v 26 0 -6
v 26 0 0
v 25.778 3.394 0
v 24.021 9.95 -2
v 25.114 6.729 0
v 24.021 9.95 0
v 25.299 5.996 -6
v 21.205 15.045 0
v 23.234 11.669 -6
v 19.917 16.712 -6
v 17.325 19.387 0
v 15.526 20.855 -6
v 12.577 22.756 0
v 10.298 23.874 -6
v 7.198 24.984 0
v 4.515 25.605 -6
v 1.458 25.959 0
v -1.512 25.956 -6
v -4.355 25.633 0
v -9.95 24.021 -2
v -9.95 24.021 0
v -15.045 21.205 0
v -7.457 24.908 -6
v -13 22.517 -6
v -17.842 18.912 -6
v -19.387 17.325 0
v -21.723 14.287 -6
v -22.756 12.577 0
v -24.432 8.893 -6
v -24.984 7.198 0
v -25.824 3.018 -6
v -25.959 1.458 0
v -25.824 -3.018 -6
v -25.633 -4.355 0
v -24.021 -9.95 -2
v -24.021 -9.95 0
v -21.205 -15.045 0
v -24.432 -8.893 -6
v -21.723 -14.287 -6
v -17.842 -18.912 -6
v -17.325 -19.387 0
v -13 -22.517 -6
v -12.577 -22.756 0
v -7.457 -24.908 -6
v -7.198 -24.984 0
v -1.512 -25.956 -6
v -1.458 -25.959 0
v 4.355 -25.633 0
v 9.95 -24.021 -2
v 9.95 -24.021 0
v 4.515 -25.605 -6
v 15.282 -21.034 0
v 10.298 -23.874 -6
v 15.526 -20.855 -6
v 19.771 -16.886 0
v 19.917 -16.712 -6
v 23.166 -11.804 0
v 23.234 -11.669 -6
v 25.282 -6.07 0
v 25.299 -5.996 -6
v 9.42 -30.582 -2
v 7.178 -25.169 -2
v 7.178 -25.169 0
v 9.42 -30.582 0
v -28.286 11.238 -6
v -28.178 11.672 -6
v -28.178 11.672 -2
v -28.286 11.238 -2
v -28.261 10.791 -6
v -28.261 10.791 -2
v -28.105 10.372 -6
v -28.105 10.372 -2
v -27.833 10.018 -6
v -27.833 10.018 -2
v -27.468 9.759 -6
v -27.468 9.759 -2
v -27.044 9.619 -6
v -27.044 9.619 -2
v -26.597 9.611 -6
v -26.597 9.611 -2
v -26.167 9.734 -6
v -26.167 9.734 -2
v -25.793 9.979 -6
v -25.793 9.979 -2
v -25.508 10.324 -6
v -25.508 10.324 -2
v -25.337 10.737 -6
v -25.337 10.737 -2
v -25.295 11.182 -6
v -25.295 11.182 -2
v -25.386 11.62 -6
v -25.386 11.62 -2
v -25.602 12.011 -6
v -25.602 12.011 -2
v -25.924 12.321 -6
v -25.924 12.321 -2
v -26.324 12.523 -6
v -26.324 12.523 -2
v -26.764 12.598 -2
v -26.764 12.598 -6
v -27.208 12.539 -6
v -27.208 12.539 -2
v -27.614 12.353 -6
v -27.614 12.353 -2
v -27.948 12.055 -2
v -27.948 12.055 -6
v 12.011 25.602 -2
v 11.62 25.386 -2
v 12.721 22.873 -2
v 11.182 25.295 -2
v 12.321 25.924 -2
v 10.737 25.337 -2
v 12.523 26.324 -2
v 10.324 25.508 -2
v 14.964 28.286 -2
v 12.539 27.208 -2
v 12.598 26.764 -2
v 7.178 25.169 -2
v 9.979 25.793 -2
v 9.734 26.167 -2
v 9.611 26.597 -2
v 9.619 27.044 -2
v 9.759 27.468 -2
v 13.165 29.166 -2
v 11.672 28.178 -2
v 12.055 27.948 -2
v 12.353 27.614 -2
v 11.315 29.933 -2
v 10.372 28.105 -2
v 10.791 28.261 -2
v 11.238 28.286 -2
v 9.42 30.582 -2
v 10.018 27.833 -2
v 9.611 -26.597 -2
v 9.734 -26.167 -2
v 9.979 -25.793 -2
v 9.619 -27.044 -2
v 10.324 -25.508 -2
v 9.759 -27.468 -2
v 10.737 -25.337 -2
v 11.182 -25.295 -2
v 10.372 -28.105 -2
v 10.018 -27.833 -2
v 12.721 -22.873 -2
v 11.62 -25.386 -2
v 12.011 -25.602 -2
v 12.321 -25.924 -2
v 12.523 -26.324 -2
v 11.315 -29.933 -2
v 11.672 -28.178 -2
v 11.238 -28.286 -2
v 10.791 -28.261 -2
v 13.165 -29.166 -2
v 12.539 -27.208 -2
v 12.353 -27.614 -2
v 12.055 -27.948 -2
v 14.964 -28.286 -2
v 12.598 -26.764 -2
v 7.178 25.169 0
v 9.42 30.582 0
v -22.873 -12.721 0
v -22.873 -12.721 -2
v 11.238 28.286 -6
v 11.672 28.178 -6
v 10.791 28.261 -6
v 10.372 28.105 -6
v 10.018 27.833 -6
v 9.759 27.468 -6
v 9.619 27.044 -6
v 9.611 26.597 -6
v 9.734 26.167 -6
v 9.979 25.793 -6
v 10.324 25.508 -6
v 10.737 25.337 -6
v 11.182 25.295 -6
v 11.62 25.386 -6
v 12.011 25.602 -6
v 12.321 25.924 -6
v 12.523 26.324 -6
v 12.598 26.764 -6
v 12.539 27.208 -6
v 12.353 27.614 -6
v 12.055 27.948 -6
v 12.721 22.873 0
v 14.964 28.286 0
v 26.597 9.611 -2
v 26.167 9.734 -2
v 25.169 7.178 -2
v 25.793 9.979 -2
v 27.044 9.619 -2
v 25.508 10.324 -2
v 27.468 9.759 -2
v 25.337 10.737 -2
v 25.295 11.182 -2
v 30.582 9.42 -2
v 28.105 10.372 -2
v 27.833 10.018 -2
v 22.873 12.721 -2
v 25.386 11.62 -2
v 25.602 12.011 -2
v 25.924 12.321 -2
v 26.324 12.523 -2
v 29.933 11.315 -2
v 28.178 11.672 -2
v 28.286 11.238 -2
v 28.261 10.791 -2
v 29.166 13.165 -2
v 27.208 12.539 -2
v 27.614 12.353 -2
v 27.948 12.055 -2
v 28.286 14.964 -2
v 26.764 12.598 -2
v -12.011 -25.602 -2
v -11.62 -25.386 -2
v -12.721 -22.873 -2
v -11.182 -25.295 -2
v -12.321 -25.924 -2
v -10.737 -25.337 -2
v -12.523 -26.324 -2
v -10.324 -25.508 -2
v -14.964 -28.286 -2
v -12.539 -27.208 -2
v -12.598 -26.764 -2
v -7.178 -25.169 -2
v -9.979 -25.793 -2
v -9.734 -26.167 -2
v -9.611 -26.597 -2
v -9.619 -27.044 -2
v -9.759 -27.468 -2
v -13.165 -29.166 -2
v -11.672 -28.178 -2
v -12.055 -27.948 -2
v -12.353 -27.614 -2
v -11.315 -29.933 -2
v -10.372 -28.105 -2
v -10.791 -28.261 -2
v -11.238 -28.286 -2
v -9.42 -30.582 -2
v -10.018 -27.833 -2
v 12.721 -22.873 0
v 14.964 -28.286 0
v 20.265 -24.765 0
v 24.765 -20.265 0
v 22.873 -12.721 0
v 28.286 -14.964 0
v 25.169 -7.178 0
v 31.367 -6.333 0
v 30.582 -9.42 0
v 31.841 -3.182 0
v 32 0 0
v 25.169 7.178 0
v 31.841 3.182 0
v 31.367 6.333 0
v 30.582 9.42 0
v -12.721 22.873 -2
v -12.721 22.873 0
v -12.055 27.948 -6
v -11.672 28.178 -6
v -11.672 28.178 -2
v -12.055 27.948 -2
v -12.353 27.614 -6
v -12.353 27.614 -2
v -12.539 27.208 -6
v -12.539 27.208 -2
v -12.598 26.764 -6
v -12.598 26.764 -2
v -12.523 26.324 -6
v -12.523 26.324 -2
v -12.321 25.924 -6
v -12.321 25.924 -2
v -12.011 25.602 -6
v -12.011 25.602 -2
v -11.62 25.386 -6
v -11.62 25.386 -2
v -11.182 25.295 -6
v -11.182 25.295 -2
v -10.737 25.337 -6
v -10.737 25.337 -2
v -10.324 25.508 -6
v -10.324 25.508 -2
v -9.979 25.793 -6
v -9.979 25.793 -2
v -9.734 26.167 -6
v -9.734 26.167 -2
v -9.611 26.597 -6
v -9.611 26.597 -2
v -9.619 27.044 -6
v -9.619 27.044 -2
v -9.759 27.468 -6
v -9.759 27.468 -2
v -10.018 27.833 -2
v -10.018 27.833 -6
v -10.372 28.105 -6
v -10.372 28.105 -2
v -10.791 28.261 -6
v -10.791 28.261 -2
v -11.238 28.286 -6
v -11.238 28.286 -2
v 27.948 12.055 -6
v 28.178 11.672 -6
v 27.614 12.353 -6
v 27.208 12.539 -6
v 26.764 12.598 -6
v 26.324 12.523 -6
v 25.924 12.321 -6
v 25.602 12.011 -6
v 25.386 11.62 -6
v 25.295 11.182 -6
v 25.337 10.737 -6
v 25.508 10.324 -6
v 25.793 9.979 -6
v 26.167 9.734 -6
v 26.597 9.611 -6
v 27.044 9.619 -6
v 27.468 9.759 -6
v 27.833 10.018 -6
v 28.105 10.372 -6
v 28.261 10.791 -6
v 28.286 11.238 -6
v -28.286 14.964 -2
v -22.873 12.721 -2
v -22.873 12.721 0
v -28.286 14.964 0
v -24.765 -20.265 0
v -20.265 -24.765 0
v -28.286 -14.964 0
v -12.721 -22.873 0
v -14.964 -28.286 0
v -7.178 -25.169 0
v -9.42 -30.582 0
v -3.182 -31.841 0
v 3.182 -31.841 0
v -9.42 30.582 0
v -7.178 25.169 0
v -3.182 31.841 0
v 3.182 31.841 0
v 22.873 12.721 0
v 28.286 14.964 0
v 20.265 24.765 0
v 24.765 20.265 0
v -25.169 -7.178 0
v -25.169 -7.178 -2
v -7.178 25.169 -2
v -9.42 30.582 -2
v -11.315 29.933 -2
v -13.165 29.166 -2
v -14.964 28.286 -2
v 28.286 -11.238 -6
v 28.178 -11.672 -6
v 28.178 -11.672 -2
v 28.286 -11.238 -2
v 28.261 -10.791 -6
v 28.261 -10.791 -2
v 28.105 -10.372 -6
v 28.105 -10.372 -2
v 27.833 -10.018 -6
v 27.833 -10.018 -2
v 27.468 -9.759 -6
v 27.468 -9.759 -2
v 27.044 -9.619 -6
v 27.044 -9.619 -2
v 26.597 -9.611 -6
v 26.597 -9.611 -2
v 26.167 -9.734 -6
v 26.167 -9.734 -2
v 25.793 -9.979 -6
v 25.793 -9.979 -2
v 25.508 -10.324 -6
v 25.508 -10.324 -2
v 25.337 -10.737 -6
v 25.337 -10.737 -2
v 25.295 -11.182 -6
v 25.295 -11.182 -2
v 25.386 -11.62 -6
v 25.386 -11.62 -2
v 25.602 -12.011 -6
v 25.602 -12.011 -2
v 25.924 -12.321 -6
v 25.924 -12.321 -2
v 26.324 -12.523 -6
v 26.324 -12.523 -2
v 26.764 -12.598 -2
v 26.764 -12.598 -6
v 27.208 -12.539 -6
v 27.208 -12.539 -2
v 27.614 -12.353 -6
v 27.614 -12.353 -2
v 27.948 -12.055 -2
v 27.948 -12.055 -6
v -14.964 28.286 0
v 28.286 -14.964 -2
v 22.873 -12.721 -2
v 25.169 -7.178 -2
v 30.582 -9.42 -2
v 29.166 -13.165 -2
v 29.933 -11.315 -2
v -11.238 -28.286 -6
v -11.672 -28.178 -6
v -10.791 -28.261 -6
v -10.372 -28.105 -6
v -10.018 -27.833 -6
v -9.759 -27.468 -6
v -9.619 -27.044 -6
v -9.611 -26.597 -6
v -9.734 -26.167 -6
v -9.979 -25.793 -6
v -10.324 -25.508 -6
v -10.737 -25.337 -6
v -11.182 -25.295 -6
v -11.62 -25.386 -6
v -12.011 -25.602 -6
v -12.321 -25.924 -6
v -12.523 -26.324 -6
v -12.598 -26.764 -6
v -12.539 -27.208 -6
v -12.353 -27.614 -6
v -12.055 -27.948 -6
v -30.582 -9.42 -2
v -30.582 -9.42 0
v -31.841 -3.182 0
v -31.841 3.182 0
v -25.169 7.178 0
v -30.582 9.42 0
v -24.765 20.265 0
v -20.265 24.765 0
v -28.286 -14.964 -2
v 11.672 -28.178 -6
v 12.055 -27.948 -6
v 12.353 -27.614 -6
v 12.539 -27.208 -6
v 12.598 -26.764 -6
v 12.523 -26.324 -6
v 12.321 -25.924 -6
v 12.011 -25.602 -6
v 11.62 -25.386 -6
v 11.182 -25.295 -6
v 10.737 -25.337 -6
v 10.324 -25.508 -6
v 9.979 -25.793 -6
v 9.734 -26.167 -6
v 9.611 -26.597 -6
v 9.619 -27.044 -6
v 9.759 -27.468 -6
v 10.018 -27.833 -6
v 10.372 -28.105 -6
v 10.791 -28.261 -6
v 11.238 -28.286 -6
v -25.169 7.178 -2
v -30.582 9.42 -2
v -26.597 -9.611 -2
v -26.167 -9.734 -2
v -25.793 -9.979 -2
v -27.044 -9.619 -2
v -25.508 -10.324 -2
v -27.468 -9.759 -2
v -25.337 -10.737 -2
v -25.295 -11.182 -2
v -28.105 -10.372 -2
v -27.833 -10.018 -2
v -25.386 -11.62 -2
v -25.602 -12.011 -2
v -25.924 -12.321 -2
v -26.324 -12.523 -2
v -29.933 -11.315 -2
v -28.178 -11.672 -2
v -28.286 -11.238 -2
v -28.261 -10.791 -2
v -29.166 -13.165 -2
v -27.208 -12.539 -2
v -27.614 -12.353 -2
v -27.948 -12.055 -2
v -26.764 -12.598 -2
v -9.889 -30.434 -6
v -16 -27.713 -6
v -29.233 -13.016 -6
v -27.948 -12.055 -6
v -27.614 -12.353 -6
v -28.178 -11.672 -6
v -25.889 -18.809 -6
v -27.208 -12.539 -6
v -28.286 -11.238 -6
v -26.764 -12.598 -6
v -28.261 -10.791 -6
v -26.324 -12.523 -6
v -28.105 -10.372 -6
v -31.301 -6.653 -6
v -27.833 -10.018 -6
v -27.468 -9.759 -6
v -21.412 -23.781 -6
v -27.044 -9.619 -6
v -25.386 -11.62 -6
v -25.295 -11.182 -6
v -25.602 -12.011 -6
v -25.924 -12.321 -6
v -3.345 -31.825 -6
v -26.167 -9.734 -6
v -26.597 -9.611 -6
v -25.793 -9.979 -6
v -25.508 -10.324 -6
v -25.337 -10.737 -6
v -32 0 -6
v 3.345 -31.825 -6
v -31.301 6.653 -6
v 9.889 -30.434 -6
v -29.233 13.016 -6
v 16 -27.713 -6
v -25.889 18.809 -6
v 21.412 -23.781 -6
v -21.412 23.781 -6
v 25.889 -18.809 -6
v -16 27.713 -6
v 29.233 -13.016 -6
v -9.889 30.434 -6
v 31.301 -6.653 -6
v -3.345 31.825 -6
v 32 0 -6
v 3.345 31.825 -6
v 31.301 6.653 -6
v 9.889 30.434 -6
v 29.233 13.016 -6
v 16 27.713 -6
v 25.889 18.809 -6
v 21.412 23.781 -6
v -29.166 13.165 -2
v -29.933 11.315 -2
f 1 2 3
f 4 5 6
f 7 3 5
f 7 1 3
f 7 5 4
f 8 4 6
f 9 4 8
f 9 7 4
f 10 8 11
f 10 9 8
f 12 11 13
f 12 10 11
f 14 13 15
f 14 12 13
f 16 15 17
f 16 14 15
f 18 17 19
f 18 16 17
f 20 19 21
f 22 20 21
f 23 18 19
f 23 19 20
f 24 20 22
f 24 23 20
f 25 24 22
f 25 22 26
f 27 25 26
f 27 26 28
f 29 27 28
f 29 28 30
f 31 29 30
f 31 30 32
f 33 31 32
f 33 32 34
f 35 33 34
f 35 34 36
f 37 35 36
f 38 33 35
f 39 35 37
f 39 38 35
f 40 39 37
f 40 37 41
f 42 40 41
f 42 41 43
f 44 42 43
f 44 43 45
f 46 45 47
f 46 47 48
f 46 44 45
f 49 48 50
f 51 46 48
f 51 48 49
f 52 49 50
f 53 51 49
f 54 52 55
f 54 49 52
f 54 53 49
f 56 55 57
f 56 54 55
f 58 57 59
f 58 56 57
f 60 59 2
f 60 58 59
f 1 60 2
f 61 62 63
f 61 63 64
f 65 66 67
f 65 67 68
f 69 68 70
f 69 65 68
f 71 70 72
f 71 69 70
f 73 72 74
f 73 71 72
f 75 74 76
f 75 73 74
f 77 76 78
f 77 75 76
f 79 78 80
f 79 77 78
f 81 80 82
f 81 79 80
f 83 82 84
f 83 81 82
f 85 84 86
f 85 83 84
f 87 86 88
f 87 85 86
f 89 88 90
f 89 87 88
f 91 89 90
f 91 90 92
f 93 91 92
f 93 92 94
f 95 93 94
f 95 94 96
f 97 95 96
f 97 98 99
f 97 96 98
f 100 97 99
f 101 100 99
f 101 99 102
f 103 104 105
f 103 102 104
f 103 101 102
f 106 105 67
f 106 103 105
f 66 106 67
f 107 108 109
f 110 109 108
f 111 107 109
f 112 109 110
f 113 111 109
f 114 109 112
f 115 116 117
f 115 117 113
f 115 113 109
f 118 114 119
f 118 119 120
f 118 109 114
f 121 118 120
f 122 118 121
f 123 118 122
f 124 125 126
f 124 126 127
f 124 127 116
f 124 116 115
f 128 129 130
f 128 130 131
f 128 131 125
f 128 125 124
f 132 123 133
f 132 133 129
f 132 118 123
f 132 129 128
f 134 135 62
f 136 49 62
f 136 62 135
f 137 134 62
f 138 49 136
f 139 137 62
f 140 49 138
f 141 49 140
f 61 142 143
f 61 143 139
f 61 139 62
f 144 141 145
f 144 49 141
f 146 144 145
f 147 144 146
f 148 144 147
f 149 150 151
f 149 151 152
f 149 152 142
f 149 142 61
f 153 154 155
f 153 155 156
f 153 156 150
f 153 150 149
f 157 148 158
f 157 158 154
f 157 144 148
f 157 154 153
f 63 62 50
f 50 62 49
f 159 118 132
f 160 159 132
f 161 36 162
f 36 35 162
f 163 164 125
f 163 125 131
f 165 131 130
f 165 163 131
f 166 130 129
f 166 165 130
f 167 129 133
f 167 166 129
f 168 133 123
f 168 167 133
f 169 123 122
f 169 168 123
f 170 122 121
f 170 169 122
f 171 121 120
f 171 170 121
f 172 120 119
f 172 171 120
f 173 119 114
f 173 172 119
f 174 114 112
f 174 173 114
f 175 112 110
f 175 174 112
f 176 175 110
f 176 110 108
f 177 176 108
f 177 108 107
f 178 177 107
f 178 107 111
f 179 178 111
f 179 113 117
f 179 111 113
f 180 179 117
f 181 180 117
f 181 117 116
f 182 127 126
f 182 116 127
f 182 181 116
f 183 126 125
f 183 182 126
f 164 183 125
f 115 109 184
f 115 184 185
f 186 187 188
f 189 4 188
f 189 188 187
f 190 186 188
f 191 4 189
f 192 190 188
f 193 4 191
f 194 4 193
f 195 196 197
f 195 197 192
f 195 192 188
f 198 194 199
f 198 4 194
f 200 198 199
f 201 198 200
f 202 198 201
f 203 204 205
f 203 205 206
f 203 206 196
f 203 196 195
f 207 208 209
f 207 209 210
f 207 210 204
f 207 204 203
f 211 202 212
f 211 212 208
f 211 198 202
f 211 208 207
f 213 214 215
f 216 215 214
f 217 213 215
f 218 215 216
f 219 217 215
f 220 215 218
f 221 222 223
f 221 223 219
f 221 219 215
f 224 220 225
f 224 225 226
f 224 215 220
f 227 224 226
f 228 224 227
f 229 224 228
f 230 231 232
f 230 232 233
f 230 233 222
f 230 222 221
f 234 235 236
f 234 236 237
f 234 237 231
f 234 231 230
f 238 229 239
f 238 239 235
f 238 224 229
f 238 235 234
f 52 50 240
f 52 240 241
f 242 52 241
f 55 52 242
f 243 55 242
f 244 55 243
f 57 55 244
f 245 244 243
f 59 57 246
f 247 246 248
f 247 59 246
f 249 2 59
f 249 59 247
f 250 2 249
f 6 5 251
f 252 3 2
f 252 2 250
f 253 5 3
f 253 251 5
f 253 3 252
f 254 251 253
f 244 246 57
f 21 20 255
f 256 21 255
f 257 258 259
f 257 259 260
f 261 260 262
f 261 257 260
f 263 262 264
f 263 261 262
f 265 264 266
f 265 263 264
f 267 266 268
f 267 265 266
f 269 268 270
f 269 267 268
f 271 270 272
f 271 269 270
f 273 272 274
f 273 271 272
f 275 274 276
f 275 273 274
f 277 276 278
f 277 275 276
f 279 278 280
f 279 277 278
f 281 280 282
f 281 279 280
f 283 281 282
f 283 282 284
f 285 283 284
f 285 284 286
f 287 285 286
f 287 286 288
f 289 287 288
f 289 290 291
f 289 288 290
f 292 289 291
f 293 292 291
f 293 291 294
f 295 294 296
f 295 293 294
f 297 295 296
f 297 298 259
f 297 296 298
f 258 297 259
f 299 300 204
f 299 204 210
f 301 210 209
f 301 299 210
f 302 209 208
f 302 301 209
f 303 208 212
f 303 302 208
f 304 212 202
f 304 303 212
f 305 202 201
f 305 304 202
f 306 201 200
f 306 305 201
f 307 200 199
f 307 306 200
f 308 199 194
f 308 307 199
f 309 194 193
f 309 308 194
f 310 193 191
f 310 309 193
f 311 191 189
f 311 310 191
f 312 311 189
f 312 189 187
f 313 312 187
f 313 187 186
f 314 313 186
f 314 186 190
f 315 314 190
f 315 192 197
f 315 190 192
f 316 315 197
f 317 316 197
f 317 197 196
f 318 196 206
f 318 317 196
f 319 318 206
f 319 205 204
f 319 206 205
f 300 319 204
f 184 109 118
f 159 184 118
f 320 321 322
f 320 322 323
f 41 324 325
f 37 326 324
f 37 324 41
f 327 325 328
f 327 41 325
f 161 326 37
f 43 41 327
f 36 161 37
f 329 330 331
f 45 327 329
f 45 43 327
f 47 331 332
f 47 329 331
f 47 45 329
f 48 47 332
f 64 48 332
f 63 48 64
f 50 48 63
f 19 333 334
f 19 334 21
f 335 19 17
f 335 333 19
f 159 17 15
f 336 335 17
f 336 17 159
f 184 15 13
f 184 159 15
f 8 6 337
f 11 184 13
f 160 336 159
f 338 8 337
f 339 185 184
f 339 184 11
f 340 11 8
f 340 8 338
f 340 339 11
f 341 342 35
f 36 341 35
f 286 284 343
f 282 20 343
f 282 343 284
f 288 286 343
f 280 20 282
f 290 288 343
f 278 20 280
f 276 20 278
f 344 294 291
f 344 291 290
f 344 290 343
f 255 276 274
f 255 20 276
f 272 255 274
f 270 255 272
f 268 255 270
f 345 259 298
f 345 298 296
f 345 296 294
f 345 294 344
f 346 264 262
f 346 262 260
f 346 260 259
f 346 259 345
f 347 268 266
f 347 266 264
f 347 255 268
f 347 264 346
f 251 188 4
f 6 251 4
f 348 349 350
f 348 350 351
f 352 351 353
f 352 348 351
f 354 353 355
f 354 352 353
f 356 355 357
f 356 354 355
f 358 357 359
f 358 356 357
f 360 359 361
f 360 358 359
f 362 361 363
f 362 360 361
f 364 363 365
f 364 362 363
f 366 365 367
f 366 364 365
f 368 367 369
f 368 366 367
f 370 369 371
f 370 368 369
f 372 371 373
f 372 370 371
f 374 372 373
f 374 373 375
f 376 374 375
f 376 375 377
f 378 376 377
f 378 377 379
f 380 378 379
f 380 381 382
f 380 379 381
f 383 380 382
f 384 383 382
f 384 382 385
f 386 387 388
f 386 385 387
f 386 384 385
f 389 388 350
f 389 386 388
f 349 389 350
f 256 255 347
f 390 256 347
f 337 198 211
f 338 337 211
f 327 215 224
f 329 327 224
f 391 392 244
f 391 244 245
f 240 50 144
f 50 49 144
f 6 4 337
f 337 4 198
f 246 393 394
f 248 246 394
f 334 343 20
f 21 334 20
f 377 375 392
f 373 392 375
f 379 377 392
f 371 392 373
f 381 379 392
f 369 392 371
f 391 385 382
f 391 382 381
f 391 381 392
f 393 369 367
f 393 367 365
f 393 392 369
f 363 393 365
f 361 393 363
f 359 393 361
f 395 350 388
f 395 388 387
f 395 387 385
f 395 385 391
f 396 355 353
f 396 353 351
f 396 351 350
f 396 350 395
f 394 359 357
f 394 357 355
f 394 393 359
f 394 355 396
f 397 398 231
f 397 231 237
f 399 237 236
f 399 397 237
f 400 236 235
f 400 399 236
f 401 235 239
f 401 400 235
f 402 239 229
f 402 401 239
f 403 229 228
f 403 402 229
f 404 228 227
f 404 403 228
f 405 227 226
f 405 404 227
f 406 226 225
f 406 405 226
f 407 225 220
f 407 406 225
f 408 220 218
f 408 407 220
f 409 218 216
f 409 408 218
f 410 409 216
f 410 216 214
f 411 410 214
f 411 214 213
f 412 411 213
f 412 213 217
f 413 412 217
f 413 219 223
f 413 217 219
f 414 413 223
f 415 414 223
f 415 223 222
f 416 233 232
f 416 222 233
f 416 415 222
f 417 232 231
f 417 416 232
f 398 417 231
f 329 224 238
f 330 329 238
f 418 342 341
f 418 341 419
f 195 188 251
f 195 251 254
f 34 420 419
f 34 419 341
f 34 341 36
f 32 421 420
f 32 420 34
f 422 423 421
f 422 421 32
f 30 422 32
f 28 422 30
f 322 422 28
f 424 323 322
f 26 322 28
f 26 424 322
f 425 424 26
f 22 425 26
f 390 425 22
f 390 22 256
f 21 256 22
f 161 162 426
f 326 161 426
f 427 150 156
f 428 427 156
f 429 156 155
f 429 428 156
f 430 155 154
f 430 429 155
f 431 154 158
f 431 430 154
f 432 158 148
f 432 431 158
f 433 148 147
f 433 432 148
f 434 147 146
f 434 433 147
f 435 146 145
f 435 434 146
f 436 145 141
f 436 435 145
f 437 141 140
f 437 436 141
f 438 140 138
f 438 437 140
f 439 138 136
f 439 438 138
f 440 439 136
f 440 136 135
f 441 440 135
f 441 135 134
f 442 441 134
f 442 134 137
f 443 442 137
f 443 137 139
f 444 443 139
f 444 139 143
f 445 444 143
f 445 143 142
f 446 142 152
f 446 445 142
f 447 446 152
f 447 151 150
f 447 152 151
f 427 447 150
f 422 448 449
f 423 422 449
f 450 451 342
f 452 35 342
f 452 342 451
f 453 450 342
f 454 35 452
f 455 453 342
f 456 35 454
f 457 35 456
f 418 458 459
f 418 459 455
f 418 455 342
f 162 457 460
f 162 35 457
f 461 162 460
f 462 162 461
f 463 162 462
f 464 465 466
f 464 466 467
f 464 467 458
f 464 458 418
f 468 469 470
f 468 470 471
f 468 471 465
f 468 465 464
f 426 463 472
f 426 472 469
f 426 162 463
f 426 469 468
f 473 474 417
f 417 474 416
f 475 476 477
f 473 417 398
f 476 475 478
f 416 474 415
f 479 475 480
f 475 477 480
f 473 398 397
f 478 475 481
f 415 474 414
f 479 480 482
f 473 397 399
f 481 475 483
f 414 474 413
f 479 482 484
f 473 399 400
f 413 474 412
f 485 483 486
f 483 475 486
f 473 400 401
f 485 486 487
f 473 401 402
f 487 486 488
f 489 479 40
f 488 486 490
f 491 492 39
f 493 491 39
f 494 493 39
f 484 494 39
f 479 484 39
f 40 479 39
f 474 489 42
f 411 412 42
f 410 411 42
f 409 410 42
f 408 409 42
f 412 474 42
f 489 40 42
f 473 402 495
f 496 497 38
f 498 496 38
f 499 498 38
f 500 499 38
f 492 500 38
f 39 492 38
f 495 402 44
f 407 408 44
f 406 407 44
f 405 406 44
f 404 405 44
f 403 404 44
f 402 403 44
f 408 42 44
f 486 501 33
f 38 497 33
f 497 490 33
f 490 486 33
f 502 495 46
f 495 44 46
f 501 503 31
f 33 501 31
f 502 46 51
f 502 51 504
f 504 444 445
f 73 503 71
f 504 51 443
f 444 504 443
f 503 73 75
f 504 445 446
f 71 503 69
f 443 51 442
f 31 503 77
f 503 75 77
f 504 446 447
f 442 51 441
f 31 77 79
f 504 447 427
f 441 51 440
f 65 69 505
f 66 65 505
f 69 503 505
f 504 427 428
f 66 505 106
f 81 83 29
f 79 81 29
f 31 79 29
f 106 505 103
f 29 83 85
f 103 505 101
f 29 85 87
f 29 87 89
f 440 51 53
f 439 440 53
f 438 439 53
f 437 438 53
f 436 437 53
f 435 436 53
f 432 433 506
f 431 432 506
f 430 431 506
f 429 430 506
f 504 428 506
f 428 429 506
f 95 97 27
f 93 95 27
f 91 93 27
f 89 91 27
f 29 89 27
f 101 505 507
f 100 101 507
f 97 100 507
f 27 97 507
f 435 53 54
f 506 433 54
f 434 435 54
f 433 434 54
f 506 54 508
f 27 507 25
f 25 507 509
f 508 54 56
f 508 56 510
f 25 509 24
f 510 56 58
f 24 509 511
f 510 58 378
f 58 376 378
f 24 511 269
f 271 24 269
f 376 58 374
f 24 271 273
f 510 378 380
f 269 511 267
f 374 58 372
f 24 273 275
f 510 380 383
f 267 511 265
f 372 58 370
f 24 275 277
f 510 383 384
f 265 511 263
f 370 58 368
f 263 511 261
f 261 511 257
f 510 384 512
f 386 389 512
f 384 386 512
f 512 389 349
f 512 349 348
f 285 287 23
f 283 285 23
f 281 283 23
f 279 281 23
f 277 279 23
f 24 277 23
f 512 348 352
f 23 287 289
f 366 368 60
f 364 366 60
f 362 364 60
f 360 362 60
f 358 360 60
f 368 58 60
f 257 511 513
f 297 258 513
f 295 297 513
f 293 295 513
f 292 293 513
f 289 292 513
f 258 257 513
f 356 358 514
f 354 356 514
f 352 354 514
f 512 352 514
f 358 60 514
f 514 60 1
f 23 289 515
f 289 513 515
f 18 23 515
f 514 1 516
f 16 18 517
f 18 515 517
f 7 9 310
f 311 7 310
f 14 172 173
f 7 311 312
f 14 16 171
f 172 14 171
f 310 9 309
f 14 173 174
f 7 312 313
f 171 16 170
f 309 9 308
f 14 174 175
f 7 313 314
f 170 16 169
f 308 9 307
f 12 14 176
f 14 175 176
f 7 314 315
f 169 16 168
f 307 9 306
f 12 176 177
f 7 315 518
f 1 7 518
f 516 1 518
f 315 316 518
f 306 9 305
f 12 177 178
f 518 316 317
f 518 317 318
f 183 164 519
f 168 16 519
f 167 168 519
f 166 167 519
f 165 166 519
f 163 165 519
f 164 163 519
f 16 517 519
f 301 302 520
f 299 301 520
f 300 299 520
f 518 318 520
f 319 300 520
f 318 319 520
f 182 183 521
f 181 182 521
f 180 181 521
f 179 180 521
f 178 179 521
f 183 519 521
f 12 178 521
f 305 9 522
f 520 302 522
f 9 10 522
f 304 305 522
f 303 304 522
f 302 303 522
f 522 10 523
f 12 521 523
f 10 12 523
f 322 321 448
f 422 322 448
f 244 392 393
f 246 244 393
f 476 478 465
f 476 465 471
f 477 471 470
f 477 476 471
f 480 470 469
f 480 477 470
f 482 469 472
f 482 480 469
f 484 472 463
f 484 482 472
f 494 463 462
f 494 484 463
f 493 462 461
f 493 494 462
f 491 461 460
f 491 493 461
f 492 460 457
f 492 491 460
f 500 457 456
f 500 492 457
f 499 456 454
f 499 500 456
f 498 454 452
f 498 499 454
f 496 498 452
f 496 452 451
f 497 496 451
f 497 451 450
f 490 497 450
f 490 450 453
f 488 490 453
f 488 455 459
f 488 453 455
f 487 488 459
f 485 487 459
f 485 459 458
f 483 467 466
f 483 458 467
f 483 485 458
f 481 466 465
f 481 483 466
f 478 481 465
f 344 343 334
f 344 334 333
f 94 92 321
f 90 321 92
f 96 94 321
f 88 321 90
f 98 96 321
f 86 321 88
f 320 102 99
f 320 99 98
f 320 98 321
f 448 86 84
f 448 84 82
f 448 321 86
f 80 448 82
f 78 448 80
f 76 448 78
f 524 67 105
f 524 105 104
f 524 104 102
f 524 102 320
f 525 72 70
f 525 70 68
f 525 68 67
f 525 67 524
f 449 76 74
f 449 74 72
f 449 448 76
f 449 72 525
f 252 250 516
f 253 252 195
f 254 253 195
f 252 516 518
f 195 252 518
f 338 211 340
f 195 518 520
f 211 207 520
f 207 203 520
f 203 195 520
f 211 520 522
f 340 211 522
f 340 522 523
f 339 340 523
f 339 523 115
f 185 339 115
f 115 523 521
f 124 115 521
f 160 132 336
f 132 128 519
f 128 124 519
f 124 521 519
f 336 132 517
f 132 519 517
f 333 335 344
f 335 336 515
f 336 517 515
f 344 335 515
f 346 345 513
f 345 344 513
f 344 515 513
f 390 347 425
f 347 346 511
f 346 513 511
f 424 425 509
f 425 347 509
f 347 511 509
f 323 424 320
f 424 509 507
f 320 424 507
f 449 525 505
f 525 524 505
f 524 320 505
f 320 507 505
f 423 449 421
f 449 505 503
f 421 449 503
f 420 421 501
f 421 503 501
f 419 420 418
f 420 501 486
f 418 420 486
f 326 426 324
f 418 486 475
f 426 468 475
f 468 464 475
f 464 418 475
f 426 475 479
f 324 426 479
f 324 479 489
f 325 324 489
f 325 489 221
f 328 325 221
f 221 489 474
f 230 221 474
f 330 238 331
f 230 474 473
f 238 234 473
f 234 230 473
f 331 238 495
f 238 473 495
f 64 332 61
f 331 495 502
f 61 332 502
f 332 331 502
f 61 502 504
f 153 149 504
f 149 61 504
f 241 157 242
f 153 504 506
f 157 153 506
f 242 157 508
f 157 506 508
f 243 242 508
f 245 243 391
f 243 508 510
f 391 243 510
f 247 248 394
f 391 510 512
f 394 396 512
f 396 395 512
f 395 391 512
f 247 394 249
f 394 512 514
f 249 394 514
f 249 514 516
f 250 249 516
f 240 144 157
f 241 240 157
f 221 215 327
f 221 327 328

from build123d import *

# Parameters (mm, degrees)
CYLINDER1945_R               = 1.5
CYLINDER1945_DEPTH           = 20
CYLINDER1945_PLACEMENT_ANGLE = 67.5
CYLINDER1943_R               = 1.5
CYLINDER1943_DEPTH           = 20
CYLINDER1943_PLACEMENT_ANGLE = 112.5
CYLINDER1936_R               = 1.5
CYLINDER1936_DEPTH           = 20
CYLINDER1936_PLACEMENT_ANGLE = 157.5
CYLINDER1952_R               = 1.5
CYLINDER1952_DEPTH           = 20
CYLINDER1952_PLACEMENT_ANGLE = 202.5
CYLINDER1946_R               = 1.5
CYLINDER1946_DEPTH           = 20
CYLINDER1946_PLACEMENT_ANGLE = -112.5
CYLINDER1938_R               = 1.5
CYLINDER1938_DEPTH           = 20
CYLINDER1938_PLACEMENT_ANGLE = 67.5
CYLINDER1935_R               = 1.5
CYLINDER1935_DEPTH           = 20
CYLINDER1935_PLACEMENT_ANGLE = 22.5
CYLINDER1941_R               = 1.5
CYLINDER1941_DEPTH           = 20
CYLINDER1941_PLACEMENT_ANGLE = 22.5
BOX442_W                     = 6
BOX442_H                     = 6
BOX442_DEPTH                 = 2
BOX442_PLACEMENT_ANGLE       = 67.5
BOX437_W                     = 6
BOX437_H                     = 6
BOX437_DEPTH                 = 2
BOX437_PLACEMENT_ANGLE       = 112.5
BOX447_W                     = 6
BOX447_H                     = 6
BOX447_DEPTH                 = 2
BOX447_PLACEMENT_ANGLE       = 157.5
BOX445_W                     = 6
BOX445_H                     = 6
BOX445_DEPTH                 = 2
BOX445_PLACEMENT_ANGLE       = 202.5
BOX446_W                     = 6
BOX446_H                     = 6
BOX446_DEPTH                 = 2
BOX446_PLACEMENT_ANGLE       = -112.5
BOX449_W                     = 6
BOX449_H                     = 6
BOX449_DEPTH                 = 2
BOX449_PLACEMENT_ANGLE       = 67.5
BOX440_W                     = 6
BOX440_H                     = 6
BOX440_DEPTH                 = 2
BOX440_PLACEMENT_ANGLE       = 22.5
BOX443_W                     = 6
BOX443_H                     = 6
BOX443_DEPTH                 = 2
BOX443_PLACEMENT_ANGLE       = 22.5
TUBE085_R                    = 32
TUBE085_R_2                  = 26
TUBE085_DEPTH                = 6


with BuildPart() as v_lec1945:
    # Cylinder1945 → Cylinder1945 (new body)
    with BuildSketch(Plane.XY):
        Circle(CYLINDER1945_R)
    extrude(amount=CYLINDER1945_DEPTH)


with BuildPart() as v_lec1945_1:
    # Cylinder1945 placement: moved
    add(v_lec1945.part.moved(Location((11.09782, 26.792506, -10))).rotate(Axis((11.09782, 26.792506, -10), (0, 0, 1)), CYLINDER1945_PLACEMENT_ANGLE))


with BuildPart() as v_lec1943:
    # Cylinder1943 → Cylinder1943 (new body)
    with BuildSketch(Plane.XY):
        Circle(CYLINDER1943_R)
    extrude(amount=CYLINDER1943_DEPTH)


with BuildPart() as v_lec1943_1:
    # Cylinder1943 placement: moved
    add(v_lec1943.part.moved(Location((-11.09782, 26.792506, -10))).rotate(Axis((-11.09782, 26.792506, -10), (0, 0, 1)), CYLINDER1943_PLACEMENT_ANGLE))


with BuildPart() as v_lec1936:
    # Cylinder1936 → Cylinder1936 (new body)
    with BuildSketch(Plane.XY):
        Circle(CYLINDER1936_R)
    extrude(amount=CYLINDER1936_DEPTH)


with BuildPart() as v_lec1936_1:
    # Cylinder1936 placement: moved
    add(v_lec1936.part.moved(Location((-26.792506, 11.09782, -10))).rotate(Axis((-26.792506, 11.09782, -10), (0, 0, 1)), CYLINDER1936_PLACEMENT_ANGLE))


with BuildPart() as v_lec1952:
    # Cylinder1952 → Cylinder1952 (new body)
    with BuildSketch(Plane.XY):
        Circle(CYLINDER1952_R)
    extrude(amount=CYLINDER1952_DEPTH)


with BuildPart() as v_lec1952_1:
    # Cylinder1952 placement: moved
    add(v_lec1952.part.moved(Location((-26.792506, -11.09782, -10))).rotate(Axis((-26.792506, -11.09782, -10), (0, 0, 1)), CYLINDER1952_PLACEMENT_ANGLE))


with BuildPart() as v_lec1946:
    # Cylinder1946 → Cylinder1946 (new body)
    with BuildSketch(Plane.XY):
        Circle(CYLINDER1946_R)
    extrude(amount=CYLINDER1946_DEPTH)


with BuildPart() as v_lec1946_1:
    # Cylinder1946 placement: moved
    add(v_lec1946.part.moved(Location((-11.09782, -26.792506, -10))).rotate(Axis((-11.09782, -26.792506, -10), (0, 0, 1)), CYLINDER1946_PLACEMENT_ANGLE))


with BuildPart() as v_lec1938:
    # Cylinder1938 → Cylinder1938 (new body)
    with BuildSketch(Plane.XY):
        Circle(CYLINDER1938_R)
    extrude(amount=CYLINDER1938_DEPTH)


with BuildPart() as v_lec1938_1:
    # Cylinder1938 placement: moved
    add(v_lec1938.part.moved(Location((11.09782, -26.792506, -10))).rotate(Axis((11.09782, -26.792506, -10), (0, 0, -1)), CYLINDER1938_PLACEMENT_ANGLE))


with BuildPart() as v_lec1935:
    # Cylinder1935 → Cylinder1935 (new body)
    with BuildSketch(Plane.XY):
        Circle(CYLINDER1935_R)
    extrude(amount=CYLINDER1935_DEPTH)


with BuildPart() as v_lec1935_1:
    # Cylinder1935 placement: moved
    add(v_lec1935.part.moved(Location((26.792506, -11.09782, -10))).rotate(Axis((26.792506, -11.09782, -10), (0, 0, -1)), CYLINDER1935_PLACEMENT_ANGLE))


with BuildPart() as compound883:
    # Cylinder1941 → Cylinder1941 (new body)
    with BuildSketch(Plane.XY):
        Circle(CYLINDER1941_R)
    extrude(amount=CYLINDER1941_DEPTH)


with BuildPart() as compound883_1:
    # Cylinder1941 placement: moved
    add(compound883.part.moved(Location((26.792506, 11.09782, -10))).rotate(Axis((26.792506, 11.09782, -10), (0, 0, 1)), CYLINDER1941_PLACEMENT_ANGLE))

    # Compound883: union Válec1945, Válec1943, Válec1936, Válec1952, Válec1946, Válec1938, Válec1935
    add(v_lec1945_1.part)
    add(v_lec1943_1.part)
    add(v_lec1936_1.part)
    add(v_lec1952_1.part)
    add(v_lec1946_1.part)
    add(v_lec1938_1.part)
    add(v_lec1935_1.part)


with BuildPart() as krychle442:
    # Box442 → Box442 (new body)
    with BuildSketch(Plane.XY):
        with Locations((3, 3)):
            Rectangle(BOX442_W, BOX442_H)
    extrude(amount=BOX442_DEPTH)


with BuildPart() as krychle442_1:
    # Box442 placement: moved
    add(krychle442.part.moved(Location((12.721408, 22.872818, -2))).rotate(Axis((12.721408, 22.872818, -2), (0, 0, 1)), BOX442_PLACEMENT_ANGLE))


with BuildPart() as krychle437:
    # Box437 → Box437 (new body)
    with BuildSketch(Plane.XY):
        with Locations((3, 3)):
            Rectangle(BOX437_W, BOX437_H)
    extrude(amount=BOX437_DEPTH)


with BuildPart() as krychle437_1:
    # Box437 placement: moved
    add(krychle437.part.moved(Location((-7.178131, 25.168918, -2))).rotate(Axis((-7.178131, 25.168918, -2), (0, 0, 1)), BOX437_PLACEMENT_ANGLE))


with BuildPart() as krychle447:
    # Box447 → Box447 (new body)
    with BuildSketch(Plane.XY):
        with Locations((3, 3)):
            Rectangle(BOX447_W, BOX447_H)
    extrude(amount=BOX447_DEPTH)


with BuildPart() as krychle447_1:
    # Box447 placement: moved
    add(krychle447.part.moved(Location((-22.872818, 12.721408, -2))).rotate(Axis((-22.872818, 12.721408, -2), (0, 0, 1)), BOX447_PLACEMENT_ANGLE))


with BuildPart() as krychle445:
    # Box445 → Box445 (new body)
    with BuildSketch(Plane.XY):
        with Locations((3, 3)):
            Rectangle(BOX445_W, BOX445_H)
    extrude(amount=BOX445_DEPTH)


with BuildPart() as krychle445_1:
    # Box445 placement: moved
    add(krychle445.part.moved(Location((-25.168918, -7.178131, -2))).rotate(Axis((-25.168918, -7.178131, -2), (0, 0, 1)), BOX445_PLACEMENT_ANGLE))


with BuildPart() as krychle446:
    # Box446 → Box446 (new body)
    with BuildSketch(Plane.XY):
        with Locations((3, 3)):
            Rectangle(BOX446_W, BOX446_H)
    extrude(amount=BOX446_DEPTH)


with BuildPart() as krychle446_1:
    # Box446 placement: moved
    add(krychle446.part.moved(Location((-12.721408, -22.872818, -2))).rotate(Axis((-12.721408, -22.872818, -2), (0, 0, 1)), BOX446_PLACEMENT_ANGLE))


with BuildPart() as krychle449:
    # Box449 → Box449 (new body)
    with BuildSketch(Plane.XY):
        with Locations((3, 3)):
            Rectangle(BOX449_W, BOX449_H)
    extrude(amount=BOX449_DEPTH)


with BuildPart() as krychle449_1:
    # Box449 placement: moved
    add(krychle449.part.moved(Location((7.178131, -25.168918, -2))).rotate(Axis((7.178131, -25.168918, -2), (0, 0, -1)), BOX449_PLACEMENT_ANGLE))


with BuildPart() as krychle440:
    # Box440 → Box440 (new body)
    with BuildSketch(Plane.XY):
        with Locations((3, 3)):
            Rectangle(BOX440_W, BOX440_H)
    extrude(amount=BOX440_DEPTH)


with BuildPart() as krychle440_1:
    # Box440 placement: moved
    add(krychle440.part.moved(Location((22.872818, -12.721408, -2))).rotate(Axis((22.872818, -12.721408, -2), (0, 0, -1)), BOX440_PLACEMENT_ANGLE))


with BuildPart() as compound876:
    # Box443 → Box443 (new body)
    with BuildSketch(Plane.XY):
        with Locations((3, 3)):
            Rectangle(BOX443_W, BOX443_H)
    extrude(amount=BOX443_DEPTH)


with BuildPart() as compound876_1:
    # Box443 placement: moved
    add(compound876.part.moved(Location((25.168918, 7.178131, -2))).rotate(Axis((25.168918, 7.178131, -2), (0, 0, 1)), BOX443_PLACEMENT_ANGLE))

    # Compound876: union Krychle442, Krychle437, Krychle447, Krychle445, Krychle446, Krychle449, Krychle440
    add(krychle442_1.part)
    add(krychle437_1.part)
    add(krychle447_1.part)
    add(krychle445_1.part)
    add(krychle446_1.part)
    add(krychle449_1.part)
    add(krychle440_1.part)


with BuildPart() as cut519:
    # Tube085 → Tube085 (new body)
    with BuildSketch(Plane.XY.offset(-6)):
        Circle(TUBE085_R)
        Circle(TUBE085_R_2, mode=Mode.SUBTRACT)
    extrude(amount=TUBE085_DEPTH)

    # Cut523: cut Compound876
    add(compound876_1.part, mode=Mode.SUBTRACT)

    # Cut519: cut Compound883
    add(compound883_1.part, mode=Mode.SUBTRACT)


solid = cut519.part
